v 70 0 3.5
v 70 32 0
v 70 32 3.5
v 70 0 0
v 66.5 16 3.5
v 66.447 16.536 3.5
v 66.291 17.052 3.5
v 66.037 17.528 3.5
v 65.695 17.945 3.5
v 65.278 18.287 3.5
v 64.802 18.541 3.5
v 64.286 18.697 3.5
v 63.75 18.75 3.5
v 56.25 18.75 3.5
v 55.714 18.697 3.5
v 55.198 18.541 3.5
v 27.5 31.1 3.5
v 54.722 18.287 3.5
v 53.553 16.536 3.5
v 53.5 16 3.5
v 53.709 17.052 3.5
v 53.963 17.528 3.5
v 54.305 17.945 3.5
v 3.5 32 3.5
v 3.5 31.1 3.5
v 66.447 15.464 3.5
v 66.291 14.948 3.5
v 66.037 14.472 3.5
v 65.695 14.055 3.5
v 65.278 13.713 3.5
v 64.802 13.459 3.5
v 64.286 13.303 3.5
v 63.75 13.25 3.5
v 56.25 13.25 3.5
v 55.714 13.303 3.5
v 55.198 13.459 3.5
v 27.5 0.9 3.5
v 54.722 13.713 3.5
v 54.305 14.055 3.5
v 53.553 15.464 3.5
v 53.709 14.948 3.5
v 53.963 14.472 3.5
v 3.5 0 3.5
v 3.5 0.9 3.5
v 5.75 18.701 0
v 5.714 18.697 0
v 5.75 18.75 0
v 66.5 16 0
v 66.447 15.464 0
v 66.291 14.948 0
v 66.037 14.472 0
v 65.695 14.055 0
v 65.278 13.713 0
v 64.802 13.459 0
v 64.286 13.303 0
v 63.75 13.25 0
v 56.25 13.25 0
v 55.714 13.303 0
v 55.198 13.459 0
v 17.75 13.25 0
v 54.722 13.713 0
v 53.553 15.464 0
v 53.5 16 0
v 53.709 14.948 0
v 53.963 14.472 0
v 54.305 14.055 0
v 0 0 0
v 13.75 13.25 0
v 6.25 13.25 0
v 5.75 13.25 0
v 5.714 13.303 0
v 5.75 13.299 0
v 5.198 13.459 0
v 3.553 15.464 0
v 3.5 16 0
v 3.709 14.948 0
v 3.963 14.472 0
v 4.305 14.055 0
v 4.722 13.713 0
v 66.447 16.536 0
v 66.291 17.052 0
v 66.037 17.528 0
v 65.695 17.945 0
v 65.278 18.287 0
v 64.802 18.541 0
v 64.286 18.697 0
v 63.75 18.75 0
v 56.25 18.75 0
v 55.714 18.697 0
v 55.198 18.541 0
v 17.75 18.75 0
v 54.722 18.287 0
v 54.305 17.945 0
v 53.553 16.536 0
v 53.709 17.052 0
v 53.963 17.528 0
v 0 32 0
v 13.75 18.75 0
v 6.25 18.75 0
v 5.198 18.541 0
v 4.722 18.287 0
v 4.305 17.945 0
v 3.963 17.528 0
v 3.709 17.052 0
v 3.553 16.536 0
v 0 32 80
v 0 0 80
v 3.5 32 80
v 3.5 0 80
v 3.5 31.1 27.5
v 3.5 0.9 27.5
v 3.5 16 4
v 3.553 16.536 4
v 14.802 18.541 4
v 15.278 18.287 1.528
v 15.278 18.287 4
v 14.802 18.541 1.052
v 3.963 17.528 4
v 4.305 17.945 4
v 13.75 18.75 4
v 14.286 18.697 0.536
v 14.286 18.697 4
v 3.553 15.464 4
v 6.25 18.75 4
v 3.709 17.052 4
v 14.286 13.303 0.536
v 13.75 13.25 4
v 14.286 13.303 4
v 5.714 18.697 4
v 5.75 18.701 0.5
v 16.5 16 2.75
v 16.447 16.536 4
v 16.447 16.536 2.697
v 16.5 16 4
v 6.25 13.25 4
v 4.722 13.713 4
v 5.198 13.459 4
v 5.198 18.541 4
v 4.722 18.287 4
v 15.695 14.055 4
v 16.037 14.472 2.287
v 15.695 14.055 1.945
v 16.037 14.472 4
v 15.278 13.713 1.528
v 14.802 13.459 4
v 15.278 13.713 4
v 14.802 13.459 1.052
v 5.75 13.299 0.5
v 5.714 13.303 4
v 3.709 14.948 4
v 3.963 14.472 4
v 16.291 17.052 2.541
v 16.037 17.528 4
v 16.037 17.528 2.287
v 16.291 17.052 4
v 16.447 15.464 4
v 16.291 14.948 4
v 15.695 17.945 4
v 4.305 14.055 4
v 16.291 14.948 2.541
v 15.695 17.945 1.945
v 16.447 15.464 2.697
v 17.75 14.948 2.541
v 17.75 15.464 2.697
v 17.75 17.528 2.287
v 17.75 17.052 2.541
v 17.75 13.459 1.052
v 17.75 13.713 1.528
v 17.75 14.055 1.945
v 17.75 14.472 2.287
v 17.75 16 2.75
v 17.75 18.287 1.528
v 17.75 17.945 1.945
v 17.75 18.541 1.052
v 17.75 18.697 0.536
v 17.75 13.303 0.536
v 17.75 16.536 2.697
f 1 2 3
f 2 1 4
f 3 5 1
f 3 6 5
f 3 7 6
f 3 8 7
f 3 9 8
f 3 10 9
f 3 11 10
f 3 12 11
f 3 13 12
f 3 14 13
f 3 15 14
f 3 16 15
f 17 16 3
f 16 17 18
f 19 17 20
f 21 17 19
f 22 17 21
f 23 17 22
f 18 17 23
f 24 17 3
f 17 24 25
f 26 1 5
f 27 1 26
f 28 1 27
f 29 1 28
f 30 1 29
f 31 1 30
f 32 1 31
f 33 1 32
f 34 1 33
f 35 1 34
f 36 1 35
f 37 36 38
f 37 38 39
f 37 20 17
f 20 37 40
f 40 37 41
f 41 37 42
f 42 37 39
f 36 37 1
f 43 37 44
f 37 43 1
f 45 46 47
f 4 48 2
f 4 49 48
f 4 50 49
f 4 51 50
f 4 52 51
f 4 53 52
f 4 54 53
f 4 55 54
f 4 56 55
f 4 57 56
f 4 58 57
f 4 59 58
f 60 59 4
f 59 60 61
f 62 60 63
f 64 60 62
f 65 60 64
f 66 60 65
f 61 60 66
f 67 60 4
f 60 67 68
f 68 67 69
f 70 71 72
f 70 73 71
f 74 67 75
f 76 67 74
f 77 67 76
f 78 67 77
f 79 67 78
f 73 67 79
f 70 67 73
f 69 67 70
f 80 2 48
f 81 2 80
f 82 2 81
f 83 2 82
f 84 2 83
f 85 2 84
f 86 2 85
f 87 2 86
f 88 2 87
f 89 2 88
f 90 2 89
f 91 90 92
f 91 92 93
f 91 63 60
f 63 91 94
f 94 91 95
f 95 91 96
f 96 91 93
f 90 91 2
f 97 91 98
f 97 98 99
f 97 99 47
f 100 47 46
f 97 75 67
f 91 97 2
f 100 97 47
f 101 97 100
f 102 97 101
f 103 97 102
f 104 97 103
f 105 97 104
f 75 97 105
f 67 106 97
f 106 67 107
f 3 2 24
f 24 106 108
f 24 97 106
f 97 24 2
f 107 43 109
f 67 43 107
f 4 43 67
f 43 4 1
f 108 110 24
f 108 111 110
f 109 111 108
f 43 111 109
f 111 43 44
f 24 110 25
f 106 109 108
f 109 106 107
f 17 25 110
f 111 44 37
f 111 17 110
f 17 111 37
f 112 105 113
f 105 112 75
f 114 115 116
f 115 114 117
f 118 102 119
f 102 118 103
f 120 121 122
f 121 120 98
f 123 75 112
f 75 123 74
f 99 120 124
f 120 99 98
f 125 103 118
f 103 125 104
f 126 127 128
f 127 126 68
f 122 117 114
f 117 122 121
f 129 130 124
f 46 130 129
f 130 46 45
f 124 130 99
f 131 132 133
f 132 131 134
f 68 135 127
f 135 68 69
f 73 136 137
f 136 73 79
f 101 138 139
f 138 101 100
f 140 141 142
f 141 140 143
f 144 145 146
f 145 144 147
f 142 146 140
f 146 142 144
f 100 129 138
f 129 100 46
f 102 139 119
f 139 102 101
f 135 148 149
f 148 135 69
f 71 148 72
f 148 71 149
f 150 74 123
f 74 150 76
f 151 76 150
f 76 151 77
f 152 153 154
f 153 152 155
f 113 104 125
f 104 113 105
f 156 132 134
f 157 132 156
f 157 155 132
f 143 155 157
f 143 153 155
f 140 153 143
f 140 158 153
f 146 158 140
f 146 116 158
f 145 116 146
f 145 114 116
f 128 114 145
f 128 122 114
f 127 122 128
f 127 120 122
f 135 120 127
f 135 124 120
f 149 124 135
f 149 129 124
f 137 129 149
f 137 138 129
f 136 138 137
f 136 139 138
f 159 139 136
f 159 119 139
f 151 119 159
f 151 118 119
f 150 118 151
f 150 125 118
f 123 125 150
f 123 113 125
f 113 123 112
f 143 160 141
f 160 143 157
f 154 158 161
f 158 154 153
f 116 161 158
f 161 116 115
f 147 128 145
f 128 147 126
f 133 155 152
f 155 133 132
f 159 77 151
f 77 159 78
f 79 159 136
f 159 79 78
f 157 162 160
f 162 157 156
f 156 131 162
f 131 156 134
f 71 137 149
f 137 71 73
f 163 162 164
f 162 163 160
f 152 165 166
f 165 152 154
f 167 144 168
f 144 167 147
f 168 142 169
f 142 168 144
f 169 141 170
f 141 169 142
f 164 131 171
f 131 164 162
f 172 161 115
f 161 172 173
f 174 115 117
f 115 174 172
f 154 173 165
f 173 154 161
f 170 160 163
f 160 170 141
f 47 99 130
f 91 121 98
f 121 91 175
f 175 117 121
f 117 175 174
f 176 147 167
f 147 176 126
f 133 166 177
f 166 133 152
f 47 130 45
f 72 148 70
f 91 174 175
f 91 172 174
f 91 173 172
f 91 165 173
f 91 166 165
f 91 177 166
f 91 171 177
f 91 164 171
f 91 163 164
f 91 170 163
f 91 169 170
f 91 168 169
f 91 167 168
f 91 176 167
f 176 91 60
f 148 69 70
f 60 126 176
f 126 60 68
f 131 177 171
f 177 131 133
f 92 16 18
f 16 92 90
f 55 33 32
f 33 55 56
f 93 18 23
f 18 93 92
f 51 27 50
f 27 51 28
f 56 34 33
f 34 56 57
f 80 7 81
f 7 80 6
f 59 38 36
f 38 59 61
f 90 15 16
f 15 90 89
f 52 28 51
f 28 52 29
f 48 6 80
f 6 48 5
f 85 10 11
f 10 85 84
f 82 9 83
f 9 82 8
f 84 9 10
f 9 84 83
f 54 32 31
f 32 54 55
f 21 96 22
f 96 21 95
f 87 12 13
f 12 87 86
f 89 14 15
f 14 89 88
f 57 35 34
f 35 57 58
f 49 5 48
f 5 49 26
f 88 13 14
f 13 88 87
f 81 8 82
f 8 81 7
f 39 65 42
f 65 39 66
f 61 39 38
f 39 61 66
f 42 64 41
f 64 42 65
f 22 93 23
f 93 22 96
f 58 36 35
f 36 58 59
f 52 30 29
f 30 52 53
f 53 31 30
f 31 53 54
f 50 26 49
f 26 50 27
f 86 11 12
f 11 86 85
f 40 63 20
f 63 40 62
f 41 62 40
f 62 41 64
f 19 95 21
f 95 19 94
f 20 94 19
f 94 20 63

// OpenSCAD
$fn = 32;

// ----------------------------------------------------------------------
// L-bracket: 70 x 32 x 80 mm
// ----------------------------------------------------------------------

// --- parameters (mm) ---
leg_a = 70;               // horizontal leg, X
leg_b = 80;               // vertical leg, Z
depth = 32;               // bracket depth, Y
thick = 3.5;              // plate thickness
hole_d = 4.5;             // clearance for M4
slot_w = 5.5;             // euro screw slot width
slot_l = 13;              // euro screw slot length
rib_leg = 30.1;           // gusset leg
rib_sink = 0.9;           // gusset overlap into the plates

module hole_z(px, py) {
  translate([px, py, -0.5]) cylinder(h = thick + 1, d = hole_d);
}
module hole_x(pz, py) {
  translate([-0.5, py, pz]) rotate([0, 90, 0]) cylinder(h = thick + 1, d = hole_d);
}
module euro_slot_z(px, py) {
  hull() {
    translate([px - (slot_l - slot_w) / 2, py, -0.5]) cylinder(h = thick + 1, d = slot_w);
    translate([px + (slot_l - slot_w) / 2, py, -0.5]) cylinder(h = thick + 1, d = slot_w);
  }
}
module euro_slot_x(pz, py) {
  translate([-0.5, 0, 0]) rotate([0, 90, 0]) hull() {
    translate([0, py, pz - (slot_l - slot_w) / 2]) cylinder(h = thick + 1, d = slot_w);
    translate([0, py, pz + (slot_l - slot_w) / 2]) cylinder(h = thick + 1, d = slot_w);
  }
}
module gusset() {
  translate([0, depth - rib_sink, 0])
    rotate([90, 0, 0])
      linear_extrude(height = depth - 2 * rib_sink)
        polygon(points = [[rib_sink, rib_sink], [rib_leg, rib_sink], [rib_sink, rib_leg]]);
}

difference() {
  union() {
    /* horizontal leg */
    cube([leg_a, depth, thick]);
    /* vertical leg, overlapping the corner block */
    cube([thick, depth, leg_b]);
    gusset();
  }
  euro_slot_z(10, 16);
  euro_slot_x(10, 16);
  euro_slot_z(60, 16);
}
